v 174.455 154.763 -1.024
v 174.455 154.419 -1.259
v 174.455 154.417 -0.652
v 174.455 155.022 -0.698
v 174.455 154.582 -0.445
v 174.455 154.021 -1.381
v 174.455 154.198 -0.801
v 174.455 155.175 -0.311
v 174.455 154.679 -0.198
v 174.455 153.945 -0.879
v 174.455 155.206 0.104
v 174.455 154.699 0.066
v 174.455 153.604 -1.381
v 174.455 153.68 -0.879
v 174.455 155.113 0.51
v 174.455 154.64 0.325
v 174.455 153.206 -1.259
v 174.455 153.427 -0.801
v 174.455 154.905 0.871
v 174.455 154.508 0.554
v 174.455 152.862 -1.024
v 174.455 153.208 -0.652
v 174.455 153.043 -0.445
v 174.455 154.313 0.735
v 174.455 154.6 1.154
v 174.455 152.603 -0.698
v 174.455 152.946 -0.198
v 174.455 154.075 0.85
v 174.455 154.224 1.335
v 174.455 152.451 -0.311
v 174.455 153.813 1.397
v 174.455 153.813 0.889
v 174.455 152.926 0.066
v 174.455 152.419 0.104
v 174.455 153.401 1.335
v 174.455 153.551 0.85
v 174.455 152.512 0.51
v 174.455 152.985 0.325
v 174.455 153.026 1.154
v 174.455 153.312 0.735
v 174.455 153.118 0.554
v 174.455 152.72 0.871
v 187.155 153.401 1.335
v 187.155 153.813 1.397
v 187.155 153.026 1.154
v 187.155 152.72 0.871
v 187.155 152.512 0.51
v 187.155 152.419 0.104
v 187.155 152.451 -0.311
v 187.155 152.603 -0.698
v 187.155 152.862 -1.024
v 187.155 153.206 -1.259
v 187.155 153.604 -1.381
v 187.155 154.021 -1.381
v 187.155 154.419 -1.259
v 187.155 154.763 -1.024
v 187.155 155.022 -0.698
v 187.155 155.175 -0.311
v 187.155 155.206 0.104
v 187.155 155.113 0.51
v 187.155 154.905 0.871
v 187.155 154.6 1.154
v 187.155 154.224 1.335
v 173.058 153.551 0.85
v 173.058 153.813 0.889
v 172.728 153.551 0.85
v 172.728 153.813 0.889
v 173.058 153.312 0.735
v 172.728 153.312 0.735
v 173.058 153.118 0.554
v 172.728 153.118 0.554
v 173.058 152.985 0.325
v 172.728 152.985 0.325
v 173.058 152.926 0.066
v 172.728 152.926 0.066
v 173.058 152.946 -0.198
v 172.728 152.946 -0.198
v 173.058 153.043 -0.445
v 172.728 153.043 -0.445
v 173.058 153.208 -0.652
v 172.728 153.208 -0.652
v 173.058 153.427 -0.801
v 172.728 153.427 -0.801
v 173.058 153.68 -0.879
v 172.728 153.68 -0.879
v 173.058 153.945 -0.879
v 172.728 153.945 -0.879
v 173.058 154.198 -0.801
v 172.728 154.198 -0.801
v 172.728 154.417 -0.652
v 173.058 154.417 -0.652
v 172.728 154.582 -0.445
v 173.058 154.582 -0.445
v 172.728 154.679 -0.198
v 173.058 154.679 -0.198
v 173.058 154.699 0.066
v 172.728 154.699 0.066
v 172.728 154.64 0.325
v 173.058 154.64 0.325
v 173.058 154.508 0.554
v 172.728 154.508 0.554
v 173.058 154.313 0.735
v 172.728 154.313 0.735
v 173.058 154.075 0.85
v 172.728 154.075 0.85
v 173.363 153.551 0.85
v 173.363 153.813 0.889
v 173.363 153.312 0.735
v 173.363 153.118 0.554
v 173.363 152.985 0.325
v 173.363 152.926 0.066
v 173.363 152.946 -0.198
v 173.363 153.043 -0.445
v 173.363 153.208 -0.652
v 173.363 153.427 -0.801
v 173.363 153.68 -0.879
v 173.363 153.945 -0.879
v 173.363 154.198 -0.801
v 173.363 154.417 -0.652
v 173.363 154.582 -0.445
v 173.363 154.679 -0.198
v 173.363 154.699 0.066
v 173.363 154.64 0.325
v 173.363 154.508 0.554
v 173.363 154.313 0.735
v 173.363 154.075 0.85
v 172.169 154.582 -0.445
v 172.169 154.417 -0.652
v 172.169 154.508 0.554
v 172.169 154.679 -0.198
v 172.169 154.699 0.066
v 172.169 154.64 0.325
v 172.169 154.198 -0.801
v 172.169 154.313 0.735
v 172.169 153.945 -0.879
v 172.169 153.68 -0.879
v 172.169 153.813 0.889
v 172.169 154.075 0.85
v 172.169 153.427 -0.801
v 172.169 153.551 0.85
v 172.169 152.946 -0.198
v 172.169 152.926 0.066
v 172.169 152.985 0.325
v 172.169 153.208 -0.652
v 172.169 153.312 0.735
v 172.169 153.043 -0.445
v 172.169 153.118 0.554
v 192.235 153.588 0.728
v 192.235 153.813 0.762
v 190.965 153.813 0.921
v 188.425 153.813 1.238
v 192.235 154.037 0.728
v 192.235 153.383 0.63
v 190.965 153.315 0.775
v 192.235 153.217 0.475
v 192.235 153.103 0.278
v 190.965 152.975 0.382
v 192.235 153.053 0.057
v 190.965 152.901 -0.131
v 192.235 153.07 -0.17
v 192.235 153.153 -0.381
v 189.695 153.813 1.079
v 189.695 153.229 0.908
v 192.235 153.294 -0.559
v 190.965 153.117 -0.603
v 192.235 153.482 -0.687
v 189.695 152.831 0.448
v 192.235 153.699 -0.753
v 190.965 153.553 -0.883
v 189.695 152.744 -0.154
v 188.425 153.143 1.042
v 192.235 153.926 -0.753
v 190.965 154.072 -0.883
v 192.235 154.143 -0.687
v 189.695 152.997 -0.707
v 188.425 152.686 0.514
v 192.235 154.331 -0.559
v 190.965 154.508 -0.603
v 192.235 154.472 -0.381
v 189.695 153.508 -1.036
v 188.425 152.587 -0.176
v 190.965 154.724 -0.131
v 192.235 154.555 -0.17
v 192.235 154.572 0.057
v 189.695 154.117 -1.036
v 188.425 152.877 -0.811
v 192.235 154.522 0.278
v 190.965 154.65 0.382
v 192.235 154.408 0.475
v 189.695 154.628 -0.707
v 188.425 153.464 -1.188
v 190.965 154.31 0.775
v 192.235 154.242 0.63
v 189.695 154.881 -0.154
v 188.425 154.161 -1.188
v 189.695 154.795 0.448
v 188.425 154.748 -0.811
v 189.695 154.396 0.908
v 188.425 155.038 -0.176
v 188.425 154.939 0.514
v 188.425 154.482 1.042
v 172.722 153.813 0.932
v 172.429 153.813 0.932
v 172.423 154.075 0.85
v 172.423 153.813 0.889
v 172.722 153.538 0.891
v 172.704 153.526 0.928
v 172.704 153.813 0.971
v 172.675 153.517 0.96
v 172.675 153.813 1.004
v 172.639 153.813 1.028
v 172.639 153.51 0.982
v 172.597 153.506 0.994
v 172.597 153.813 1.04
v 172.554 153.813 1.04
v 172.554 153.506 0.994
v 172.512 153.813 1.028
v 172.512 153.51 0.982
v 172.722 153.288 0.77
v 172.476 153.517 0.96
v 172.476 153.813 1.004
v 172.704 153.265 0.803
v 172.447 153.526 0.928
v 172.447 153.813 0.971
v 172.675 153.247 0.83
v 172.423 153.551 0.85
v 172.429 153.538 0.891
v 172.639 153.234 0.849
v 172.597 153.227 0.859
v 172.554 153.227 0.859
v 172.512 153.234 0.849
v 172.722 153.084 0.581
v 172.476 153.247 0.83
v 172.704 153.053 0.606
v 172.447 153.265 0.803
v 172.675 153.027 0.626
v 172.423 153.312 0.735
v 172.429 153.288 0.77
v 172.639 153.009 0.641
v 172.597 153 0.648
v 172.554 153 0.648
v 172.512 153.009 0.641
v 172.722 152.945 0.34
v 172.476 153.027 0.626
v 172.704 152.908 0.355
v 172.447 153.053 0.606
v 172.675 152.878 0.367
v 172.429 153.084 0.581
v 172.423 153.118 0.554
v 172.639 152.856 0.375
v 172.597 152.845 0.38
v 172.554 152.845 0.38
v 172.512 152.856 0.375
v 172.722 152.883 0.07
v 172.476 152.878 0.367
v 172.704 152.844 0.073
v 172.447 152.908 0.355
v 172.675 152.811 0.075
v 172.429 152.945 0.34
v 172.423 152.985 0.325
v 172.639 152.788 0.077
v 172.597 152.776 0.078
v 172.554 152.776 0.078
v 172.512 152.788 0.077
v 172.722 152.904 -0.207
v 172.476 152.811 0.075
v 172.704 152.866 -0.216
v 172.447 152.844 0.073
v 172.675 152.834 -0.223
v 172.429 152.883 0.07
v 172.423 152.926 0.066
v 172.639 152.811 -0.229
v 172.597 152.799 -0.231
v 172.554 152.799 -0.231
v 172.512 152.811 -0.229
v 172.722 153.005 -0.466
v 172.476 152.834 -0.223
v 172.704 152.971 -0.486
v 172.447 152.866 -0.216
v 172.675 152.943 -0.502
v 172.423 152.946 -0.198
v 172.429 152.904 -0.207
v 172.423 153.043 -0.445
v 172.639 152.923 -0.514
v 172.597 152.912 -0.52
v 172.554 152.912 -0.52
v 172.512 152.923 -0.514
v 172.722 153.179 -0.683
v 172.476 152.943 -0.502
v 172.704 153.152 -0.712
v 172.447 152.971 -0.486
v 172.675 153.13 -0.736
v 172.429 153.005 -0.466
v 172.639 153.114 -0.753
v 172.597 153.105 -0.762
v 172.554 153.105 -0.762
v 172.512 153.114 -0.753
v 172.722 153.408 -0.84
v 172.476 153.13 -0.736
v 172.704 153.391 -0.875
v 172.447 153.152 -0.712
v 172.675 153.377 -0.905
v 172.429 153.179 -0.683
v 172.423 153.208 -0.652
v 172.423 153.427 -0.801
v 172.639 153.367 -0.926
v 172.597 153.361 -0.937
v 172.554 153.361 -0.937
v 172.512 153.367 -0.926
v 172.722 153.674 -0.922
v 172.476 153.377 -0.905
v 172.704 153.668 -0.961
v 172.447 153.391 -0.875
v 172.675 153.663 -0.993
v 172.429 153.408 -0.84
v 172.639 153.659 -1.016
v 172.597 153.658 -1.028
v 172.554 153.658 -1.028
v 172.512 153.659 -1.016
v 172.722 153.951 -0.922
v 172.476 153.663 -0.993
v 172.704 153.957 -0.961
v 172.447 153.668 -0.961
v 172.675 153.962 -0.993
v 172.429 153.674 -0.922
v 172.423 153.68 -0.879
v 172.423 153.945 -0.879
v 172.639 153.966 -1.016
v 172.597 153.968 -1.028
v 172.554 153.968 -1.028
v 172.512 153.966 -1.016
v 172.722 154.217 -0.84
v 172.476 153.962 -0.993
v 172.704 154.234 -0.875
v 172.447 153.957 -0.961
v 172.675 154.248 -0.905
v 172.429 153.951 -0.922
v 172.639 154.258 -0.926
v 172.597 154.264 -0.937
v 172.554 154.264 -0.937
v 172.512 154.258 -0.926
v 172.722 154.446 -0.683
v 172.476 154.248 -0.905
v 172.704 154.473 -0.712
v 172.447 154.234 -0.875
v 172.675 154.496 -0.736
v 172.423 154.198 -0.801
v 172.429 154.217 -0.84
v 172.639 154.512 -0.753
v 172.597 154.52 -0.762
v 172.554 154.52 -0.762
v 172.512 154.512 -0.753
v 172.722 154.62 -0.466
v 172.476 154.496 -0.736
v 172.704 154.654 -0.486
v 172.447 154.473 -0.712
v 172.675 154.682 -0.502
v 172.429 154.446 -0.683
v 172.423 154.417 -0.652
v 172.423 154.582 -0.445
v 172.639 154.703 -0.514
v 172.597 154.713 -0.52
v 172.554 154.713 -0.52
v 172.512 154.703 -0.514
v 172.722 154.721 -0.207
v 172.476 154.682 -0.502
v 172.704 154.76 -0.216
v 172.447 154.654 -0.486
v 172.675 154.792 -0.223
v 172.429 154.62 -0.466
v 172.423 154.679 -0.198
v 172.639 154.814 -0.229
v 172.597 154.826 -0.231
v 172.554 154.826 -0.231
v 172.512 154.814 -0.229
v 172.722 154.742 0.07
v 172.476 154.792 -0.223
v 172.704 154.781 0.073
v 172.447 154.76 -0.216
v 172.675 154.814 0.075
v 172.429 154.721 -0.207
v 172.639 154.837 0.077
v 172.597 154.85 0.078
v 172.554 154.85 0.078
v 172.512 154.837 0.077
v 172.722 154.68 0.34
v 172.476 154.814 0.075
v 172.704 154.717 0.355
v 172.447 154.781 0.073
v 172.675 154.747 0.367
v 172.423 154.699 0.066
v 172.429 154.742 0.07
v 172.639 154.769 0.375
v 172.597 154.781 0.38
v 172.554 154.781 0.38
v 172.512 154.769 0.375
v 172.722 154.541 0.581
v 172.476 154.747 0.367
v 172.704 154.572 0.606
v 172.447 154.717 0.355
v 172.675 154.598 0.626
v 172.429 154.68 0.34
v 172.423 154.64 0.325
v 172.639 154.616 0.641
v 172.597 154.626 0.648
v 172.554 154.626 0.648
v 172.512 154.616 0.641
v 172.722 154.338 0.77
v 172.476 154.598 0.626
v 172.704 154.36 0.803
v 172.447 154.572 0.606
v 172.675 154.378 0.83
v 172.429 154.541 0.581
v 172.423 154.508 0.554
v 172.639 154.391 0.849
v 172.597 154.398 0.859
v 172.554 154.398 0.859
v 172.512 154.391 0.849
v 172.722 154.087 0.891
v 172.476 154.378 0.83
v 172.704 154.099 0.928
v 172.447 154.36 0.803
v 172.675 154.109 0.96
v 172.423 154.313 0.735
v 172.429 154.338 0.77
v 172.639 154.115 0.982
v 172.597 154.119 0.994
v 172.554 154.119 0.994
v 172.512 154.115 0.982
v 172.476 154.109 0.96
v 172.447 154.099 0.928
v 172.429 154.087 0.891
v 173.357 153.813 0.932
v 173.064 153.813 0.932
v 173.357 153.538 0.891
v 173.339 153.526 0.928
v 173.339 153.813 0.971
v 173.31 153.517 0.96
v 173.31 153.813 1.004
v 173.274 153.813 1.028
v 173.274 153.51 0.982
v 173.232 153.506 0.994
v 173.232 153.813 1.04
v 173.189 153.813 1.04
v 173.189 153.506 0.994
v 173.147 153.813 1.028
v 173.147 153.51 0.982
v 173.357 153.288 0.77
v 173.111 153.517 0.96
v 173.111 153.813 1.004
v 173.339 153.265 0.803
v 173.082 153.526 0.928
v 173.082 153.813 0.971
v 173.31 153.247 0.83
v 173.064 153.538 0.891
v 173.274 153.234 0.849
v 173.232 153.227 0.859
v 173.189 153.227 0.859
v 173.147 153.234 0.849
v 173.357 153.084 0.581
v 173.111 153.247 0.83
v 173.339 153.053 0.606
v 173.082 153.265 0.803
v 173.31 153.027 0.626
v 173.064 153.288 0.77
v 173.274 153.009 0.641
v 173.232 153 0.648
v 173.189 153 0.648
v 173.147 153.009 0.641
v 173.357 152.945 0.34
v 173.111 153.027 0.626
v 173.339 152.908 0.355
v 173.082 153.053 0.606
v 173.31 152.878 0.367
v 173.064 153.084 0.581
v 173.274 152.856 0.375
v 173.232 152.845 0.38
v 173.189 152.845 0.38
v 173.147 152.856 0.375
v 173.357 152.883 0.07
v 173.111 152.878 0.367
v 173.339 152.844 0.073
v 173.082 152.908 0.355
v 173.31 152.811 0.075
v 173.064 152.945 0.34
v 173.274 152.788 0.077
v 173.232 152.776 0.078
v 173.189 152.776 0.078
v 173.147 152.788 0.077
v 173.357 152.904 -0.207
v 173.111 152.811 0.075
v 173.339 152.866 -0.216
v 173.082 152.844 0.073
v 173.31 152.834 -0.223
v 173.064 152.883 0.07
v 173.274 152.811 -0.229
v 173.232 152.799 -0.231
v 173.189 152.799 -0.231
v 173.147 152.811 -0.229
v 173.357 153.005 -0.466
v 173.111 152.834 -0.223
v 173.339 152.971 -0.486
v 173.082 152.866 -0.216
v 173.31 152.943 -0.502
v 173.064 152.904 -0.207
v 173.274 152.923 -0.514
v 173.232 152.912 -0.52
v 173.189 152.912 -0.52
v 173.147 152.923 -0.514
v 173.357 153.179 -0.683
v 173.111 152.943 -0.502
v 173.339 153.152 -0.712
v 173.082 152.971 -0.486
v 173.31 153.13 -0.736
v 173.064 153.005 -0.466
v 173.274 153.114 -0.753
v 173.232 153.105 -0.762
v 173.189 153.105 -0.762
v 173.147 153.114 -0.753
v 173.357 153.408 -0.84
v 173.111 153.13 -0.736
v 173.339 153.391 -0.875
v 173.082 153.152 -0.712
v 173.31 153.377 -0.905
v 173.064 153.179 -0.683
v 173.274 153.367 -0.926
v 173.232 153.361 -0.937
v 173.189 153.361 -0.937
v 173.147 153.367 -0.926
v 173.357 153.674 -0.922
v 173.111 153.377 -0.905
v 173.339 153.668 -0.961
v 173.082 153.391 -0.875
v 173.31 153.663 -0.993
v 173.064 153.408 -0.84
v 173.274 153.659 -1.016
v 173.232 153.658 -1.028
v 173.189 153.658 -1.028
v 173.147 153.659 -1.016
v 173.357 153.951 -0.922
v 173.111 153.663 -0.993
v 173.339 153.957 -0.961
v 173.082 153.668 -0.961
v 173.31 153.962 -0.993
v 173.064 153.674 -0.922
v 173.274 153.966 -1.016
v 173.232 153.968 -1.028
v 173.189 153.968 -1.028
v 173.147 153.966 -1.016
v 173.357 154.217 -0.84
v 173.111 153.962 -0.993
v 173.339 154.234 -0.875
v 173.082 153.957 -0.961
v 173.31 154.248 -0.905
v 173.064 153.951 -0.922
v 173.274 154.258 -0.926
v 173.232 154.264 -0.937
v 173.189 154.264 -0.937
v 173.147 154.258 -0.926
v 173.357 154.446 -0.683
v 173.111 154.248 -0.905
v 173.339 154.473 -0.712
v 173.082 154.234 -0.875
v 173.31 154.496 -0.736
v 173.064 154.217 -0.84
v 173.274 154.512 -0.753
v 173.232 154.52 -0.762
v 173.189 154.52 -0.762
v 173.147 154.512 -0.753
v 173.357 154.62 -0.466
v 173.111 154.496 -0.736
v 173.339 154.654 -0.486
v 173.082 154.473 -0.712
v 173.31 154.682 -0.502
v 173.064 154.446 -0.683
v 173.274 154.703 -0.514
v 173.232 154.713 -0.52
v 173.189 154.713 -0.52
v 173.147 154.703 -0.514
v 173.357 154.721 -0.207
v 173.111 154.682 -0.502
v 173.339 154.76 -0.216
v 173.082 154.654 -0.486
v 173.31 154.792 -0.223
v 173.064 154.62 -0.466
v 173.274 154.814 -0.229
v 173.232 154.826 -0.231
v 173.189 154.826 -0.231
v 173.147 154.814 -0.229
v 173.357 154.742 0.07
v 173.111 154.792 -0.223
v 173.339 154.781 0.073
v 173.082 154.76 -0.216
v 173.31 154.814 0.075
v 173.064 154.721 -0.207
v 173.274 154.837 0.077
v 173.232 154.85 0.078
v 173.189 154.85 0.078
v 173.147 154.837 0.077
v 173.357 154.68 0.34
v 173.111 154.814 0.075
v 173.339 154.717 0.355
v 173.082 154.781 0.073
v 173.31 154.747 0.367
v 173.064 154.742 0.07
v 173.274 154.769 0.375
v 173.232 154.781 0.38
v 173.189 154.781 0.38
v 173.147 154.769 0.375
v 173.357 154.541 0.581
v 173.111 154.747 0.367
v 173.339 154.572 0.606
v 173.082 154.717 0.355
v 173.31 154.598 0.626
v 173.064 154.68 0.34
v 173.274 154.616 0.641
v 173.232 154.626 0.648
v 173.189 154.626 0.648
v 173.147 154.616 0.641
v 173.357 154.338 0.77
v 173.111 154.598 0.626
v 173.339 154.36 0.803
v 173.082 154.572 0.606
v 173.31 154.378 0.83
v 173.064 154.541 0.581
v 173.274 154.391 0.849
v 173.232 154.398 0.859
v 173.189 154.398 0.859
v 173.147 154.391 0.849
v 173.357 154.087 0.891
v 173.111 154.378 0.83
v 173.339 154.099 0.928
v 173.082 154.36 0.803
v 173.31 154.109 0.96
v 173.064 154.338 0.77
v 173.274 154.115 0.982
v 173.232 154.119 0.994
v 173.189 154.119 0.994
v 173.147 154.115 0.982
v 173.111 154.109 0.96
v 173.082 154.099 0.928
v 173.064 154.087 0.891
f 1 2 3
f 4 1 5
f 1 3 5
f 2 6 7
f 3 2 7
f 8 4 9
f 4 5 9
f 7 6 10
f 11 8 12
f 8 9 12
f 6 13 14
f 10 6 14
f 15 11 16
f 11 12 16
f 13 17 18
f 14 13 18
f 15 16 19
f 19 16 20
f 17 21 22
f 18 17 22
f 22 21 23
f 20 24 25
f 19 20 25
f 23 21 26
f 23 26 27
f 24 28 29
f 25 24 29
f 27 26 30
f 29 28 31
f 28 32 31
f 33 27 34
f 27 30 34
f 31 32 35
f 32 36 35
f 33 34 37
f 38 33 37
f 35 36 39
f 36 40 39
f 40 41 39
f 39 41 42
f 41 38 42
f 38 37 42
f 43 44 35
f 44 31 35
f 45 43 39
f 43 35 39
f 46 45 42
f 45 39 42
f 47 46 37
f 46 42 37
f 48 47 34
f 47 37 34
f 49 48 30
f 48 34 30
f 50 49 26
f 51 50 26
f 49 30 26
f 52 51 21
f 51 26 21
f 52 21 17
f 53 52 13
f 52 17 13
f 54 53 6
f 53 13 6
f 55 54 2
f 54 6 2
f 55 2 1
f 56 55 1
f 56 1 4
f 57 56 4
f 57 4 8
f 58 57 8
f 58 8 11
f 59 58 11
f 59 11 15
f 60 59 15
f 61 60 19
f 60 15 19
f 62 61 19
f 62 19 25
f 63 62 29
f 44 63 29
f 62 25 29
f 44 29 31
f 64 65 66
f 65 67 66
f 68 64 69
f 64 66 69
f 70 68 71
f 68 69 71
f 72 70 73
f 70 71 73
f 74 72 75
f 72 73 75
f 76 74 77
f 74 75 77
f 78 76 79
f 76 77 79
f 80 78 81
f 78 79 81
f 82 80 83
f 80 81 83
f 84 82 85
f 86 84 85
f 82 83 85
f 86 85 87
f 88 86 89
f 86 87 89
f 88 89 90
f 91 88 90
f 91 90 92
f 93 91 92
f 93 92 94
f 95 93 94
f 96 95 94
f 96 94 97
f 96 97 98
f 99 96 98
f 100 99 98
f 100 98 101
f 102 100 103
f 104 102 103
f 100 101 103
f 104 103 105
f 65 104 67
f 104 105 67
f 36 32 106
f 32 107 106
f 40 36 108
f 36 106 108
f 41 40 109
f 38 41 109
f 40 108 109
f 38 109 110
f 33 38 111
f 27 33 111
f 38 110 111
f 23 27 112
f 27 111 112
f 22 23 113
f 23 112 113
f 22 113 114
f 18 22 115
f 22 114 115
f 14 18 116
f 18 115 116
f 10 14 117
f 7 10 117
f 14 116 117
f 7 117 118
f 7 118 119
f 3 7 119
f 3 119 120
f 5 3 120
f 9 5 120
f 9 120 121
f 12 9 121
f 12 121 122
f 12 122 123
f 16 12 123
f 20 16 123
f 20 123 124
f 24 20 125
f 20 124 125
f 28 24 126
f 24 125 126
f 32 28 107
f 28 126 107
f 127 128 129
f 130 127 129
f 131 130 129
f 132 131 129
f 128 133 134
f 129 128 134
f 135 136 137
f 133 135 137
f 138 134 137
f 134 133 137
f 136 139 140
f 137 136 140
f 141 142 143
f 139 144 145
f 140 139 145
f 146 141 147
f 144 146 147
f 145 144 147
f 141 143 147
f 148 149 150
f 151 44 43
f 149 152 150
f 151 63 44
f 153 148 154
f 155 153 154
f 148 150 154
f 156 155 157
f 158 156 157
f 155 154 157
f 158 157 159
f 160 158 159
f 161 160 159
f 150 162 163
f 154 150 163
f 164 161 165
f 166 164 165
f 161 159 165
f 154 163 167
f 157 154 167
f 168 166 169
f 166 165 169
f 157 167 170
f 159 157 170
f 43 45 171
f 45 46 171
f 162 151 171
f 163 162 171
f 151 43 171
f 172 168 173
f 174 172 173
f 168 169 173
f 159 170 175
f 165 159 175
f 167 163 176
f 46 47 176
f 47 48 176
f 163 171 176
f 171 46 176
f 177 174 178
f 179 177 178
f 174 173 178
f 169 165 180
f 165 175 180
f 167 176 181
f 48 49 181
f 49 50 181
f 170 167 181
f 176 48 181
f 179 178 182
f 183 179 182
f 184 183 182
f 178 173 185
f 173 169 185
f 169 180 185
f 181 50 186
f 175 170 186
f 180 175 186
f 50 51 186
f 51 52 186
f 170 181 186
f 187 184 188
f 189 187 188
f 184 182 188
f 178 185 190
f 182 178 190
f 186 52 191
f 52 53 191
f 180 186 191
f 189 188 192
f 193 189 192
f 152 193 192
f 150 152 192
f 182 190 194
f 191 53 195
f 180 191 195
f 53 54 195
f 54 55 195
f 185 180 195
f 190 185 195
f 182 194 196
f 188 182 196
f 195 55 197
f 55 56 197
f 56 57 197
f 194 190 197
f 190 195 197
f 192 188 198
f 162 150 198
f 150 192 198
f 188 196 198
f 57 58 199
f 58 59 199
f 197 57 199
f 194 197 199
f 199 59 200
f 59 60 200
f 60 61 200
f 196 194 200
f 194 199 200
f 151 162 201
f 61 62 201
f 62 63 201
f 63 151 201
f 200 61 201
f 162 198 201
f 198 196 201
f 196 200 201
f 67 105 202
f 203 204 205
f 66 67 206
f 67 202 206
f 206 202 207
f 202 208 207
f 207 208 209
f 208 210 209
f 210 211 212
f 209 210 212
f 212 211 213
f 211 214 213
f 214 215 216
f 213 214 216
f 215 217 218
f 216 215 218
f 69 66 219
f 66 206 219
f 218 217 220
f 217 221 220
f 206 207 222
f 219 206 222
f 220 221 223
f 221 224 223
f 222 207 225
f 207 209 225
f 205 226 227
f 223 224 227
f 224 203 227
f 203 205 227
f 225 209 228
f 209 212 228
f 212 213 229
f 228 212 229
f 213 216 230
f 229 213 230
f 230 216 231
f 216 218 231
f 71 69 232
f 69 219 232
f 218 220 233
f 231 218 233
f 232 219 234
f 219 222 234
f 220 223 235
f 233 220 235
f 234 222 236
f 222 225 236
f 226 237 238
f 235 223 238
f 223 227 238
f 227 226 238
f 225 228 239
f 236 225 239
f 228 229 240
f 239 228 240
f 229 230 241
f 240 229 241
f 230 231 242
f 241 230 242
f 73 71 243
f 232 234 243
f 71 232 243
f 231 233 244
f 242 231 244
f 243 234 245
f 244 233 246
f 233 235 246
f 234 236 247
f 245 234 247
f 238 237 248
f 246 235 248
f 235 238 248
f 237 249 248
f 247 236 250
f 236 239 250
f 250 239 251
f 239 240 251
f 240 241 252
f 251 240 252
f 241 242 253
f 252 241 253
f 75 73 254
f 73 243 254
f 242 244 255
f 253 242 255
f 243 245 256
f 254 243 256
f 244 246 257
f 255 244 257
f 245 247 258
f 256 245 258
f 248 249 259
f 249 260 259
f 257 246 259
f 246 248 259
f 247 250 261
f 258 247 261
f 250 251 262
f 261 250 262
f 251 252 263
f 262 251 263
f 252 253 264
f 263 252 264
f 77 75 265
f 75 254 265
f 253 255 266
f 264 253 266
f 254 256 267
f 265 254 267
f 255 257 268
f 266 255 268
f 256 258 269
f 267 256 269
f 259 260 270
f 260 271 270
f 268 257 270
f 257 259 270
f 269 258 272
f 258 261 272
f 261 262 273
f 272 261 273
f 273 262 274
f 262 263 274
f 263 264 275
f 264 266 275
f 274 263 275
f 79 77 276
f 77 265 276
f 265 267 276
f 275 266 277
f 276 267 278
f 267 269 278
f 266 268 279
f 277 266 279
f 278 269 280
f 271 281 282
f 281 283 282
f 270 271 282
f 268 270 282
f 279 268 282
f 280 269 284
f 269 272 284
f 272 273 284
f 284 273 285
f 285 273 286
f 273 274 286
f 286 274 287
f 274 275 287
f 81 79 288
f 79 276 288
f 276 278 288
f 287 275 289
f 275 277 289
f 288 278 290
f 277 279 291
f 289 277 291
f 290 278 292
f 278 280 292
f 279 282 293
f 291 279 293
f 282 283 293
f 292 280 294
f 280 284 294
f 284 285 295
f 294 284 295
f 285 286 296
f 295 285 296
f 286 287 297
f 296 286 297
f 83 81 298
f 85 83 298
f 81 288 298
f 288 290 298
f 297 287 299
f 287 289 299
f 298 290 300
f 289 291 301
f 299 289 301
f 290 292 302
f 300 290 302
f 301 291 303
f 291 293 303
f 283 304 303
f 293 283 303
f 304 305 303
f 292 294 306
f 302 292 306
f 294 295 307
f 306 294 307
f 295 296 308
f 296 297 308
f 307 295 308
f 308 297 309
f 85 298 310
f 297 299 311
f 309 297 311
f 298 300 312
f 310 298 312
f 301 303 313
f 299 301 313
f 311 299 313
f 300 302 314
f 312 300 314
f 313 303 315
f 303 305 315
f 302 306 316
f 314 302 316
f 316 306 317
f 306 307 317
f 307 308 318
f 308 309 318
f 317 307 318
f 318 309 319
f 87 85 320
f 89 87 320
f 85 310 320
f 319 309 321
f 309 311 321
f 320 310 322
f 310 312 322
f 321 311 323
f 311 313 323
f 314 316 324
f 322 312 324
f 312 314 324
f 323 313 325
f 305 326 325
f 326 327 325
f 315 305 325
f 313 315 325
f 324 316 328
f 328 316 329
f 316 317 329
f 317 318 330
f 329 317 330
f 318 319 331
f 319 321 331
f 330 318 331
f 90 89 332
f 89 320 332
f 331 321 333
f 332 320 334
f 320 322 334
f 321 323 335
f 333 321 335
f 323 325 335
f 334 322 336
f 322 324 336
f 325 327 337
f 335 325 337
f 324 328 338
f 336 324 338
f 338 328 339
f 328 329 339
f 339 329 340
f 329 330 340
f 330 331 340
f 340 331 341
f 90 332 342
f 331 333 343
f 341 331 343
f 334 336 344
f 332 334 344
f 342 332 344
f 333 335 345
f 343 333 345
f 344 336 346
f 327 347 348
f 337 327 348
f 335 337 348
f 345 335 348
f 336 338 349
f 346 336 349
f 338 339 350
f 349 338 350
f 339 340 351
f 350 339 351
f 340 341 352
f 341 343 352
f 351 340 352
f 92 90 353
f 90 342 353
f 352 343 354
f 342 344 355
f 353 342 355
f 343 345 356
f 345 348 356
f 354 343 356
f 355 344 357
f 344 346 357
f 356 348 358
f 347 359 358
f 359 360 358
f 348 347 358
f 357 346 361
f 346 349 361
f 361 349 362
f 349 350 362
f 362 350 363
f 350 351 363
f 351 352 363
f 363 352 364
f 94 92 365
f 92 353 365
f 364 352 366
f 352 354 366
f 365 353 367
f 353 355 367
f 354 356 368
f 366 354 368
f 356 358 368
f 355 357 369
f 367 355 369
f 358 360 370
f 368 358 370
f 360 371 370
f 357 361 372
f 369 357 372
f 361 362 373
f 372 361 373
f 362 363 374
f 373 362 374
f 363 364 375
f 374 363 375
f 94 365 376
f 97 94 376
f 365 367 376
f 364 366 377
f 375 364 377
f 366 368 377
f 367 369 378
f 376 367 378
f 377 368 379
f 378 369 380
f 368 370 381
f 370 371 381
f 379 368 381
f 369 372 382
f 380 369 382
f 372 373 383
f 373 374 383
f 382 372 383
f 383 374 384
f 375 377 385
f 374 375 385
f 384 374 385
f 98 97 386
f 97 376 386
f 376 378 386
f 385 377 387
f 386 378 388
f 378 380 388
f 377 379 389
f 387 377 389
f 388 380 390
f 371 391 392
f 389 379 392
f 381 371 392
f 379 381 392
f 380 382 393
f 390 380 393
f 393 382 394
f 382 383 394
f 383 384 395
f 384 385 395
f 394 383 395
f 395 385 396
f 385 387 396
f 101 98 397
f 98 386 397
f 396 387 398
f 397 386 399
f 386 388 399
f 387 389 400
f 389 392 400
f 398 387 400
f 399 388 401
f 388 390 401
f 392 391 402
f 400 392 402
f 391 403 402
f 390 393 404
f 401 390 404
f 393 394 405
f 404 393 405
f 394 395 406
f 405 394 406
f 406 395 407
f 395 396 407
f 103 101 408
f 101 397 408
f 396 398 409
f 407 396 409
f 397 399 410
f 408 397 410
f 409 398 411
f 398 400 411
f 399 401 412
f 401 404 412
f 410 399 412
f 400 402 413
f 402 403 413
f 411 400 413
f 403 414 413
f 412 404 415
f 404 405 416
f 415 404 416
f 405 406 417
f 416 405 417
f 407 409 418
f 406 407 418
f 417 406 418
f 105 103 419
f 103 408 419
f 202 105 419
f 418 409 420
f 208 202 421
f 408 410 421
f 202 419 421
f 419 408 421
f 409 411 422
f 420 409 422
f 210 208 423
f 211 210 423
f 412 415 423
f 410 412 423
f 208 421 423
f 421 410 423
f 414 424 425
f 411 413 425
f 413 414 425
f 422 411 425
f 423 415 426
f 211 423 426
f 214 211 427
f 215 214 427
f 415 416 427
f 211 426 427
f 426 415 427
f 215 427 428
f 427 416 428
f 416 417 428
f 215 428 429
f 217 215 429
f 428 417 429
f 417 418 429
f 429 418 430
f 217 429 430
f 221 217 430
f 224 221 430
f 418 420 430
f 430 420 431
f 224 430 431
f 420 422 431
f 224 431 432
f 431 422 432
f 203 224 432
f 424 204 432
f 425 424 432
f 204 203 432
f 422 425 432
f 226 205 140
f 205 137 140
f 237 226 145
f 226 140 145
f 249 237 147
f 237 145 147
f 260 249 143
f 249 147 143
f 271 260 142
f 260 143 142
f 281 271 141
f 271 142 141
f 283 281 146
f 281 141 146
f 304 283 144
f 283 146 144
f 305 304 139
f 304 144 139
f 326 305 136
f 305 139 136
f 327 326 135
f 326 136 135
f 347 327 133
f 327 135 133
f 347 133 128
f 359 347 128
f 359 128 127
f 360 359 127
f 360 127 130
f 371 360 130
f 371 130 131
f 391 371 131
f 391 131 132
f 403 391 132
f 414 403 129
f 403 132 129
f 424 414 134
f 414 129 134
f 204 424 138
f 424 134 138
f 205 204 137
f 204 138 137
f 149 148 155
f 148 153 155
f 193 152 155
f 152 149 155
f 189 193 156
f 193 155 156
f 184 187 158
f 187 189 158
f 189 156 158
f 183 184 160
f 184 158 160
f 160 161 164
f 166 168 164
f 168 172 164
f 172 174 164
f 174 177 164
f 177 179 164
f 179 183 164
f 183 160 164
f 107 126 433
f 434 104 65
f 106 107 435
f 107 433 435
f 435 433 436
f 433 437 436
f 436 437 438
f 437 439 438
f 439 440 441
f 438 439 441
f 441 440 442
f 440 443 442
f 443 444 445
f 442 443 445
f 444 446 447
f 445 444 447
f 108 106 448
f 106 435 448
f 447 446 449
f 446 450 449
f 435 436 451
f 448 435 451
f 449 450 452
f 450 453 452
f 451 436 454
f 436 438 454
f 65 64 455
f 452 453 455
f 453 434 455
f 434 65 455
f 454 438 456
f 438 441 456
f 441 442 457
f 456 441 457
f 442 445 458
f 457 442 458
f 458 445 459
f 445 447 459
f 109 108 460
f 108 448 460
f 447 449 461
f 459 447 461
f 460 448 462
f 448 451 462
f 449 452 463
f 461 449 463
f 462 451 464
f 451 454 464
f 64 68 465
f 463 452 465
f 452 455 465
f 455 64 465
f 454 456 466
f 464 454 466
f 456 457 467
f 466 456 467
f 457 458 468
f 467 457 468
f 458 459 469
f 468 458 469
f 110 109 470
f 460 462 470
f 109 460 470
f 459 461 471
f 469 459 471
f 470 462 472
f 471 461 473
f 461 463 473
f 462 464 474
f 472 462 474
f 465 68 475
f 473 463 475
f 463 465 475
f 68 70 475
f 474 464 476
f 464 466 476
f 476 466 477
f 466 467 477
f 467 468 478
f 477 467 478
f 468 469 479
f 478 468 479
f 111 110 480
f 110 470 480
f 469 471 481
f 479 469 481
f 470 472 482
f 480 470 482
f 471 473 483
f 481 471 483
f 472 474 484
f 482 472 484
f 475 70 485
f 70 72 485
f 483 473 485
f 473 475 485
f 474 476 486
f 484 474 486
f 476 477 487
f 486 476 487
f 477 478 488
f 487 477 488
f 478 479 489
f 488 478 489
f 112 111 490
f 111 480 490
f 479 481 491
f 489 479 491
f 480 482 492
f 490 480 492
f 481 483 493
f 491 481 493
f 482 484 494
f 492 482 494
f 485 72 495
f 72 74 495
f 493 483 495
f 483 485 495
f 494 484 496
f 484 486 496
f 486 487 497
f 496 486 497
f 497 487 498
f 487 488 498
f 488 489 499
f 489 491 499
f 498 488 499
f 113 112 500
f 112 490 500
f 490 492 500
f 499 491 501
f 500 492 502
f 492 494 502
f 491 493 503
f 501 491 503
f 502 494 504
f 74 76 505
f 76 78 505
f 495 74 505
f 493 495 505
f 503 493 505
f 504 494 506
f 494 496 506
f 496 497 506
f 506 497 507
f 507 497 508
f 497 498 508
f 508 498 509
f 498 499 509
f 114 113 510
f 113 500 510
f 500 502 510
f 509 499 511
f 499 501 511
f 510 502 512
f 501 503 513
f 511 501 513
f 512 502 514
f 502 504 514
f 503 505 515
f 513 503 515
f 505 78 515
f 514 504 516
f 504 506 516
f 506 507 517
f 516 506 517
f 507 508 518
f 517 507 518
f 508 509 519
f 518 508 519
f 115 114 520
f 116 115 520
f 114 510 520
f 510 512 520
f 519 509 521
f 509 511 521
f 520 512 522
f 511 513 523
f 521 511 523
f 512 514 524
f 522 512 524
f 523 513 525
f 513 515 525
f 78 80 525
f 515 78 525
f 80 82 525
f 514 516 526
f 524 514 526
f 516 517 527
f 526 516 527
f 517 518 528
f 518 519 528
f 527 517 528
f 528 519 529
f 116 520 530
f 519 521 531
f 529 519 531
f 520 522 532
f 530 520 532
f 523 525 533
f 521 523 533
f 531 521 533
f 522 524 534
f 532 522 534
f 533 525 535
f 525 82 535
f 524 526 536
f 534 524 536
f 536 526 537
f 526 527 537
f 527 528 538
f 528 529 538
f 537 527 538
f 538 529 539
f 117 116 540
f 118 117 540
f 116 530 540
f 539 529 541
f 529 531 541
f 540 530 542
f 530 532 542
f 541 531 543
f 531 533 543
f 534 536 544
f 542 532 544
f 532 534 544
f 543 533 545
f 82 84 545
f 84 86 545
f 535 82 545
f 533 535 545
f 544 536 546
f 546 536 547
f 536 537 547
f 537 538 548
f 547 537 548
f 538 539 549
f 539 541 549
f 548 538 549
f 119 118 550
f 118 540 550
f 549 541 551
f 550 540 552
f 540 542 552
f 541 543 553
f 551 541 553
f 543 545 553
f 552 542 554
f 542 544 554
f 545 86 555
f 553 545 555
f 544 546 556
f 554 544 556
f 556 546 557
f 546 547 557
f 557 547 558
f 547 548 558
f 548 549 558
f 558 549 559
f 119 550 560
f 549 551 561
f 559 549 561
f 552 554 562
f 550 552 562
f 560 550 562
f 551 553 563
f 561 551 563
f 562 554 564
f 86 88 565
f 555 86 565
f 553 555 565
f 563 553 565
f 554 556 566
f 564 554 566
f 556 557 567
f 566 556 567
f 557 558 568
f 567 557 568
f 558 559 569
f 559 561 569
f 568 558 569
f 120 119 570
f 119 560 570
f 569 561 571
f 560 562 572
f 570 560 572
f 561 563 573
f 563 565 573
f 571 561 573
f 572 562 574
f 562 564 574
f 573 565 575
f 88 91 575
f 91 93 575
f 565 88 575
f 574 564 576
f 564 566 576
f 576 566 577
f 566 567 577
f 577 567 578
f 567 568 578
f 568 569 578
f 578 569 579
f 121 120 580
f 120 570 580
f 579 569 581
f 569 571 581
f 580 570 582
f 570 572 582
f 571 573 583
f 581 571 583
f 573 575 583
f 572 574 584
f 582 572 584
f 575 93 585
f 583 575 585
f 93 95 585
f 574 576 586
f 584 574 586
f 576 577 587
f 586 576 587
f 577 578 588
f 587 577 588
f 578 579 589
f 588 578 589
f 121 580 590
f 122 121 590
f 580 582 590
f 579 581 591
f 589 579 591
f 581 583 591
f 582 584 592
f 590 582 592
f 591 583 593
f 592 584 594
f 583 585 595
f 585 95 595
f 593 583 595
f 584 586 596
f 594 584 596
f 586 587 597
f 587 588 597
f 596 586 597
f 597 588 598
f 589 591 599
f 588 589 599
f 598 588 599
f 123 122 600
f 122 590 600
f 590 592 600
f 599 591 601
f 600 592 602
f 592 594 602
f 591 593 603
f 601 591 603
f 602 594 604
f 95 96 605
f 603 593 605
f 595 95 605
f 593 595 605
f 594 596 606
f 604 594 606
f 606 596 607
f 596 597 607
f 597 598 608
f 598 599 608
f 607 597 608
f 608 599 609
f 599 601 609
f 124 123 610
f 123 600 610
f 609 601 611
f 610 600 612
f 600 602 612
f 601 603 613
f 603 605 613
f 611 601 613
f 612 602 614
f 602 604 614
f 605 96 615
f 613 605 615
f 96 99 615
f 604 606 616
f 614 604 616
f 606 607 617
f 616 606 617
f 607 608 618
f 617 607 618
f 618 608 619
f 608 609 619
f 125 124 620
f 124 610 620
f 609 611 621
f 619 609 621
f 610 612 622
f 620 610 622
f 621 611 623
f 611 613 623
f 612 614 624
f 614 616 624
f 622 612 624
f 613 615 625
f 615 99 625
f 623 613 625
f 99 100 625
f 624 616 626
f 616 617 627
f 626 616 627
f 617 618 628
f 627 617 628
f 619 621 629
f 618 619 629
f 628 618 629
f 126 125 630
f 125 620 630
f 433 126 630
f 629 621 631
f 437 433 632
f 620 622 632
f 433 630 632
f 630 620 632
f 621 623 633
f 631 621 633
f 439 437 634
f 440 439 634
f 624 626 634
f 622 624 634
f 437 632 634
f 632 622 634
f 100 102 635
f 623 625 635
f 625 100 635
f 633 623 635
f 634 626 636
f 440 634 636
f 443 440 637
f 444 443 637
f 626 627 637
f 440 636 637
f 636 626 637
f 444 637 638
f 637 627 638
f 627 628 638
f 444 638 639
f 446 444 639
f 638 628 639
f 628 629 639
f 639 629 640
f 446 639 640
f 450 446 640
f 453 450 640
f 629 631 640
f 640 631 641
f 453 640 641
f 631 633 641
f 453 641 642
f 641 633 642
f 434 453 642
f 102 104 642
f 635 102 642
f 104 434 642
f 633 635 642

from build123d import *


with BuildPart() as part:
    # Sketch1 → Revolve1 (revolve)
    with BuildSketch(Plane.XY, mode=Mode.PRIVATE) as revolve1_sk:
        with BuildLine():
            Line((172.16927252, 153.812567331), (192.23527252, 153.812567331))
            Line((192.23527252, 153.812567331), (192.23527252, 154.574567331))
            Line((192.23527252, 154.574567331), (187.15527252, 155.209567331))
            Line((187.15527252, 155.209567331), (174.45527252, 155.209567331))
            Line((174.45527252, 155.209567331), (174.45527252, 154.701567331))
            Line((174.45527252, 154.701567331), (173.36307252, 154.701567331))
            ThreePointArc((173.36307252, 154.701567331), (173.21067252, 154.853967331), (173.05827252, 154.701567331))
            Line((173.05827252, 154.701567331), (172.72807252, 154.701567331))
            ThreePointArc((172.72807252, 154.701567331), (172.57567252, 154.853967331), (172.42327252, 154.701567331))
            Line((172.42327252, 154.701567331), (172.16927252, 154.701567331))
            Line((172.16927252, 154.701567331), (172.16927252, 153.812567331))
        make_face()
    revolve(revolve1_sk.sketch.rotate(Axis((172.16927252, 153.812567331, 0), (1, 0, 0)), 90), axis=Axis((172.16927252, 153.812567331, 0), (1, 0, 0)))


solid = part.part
